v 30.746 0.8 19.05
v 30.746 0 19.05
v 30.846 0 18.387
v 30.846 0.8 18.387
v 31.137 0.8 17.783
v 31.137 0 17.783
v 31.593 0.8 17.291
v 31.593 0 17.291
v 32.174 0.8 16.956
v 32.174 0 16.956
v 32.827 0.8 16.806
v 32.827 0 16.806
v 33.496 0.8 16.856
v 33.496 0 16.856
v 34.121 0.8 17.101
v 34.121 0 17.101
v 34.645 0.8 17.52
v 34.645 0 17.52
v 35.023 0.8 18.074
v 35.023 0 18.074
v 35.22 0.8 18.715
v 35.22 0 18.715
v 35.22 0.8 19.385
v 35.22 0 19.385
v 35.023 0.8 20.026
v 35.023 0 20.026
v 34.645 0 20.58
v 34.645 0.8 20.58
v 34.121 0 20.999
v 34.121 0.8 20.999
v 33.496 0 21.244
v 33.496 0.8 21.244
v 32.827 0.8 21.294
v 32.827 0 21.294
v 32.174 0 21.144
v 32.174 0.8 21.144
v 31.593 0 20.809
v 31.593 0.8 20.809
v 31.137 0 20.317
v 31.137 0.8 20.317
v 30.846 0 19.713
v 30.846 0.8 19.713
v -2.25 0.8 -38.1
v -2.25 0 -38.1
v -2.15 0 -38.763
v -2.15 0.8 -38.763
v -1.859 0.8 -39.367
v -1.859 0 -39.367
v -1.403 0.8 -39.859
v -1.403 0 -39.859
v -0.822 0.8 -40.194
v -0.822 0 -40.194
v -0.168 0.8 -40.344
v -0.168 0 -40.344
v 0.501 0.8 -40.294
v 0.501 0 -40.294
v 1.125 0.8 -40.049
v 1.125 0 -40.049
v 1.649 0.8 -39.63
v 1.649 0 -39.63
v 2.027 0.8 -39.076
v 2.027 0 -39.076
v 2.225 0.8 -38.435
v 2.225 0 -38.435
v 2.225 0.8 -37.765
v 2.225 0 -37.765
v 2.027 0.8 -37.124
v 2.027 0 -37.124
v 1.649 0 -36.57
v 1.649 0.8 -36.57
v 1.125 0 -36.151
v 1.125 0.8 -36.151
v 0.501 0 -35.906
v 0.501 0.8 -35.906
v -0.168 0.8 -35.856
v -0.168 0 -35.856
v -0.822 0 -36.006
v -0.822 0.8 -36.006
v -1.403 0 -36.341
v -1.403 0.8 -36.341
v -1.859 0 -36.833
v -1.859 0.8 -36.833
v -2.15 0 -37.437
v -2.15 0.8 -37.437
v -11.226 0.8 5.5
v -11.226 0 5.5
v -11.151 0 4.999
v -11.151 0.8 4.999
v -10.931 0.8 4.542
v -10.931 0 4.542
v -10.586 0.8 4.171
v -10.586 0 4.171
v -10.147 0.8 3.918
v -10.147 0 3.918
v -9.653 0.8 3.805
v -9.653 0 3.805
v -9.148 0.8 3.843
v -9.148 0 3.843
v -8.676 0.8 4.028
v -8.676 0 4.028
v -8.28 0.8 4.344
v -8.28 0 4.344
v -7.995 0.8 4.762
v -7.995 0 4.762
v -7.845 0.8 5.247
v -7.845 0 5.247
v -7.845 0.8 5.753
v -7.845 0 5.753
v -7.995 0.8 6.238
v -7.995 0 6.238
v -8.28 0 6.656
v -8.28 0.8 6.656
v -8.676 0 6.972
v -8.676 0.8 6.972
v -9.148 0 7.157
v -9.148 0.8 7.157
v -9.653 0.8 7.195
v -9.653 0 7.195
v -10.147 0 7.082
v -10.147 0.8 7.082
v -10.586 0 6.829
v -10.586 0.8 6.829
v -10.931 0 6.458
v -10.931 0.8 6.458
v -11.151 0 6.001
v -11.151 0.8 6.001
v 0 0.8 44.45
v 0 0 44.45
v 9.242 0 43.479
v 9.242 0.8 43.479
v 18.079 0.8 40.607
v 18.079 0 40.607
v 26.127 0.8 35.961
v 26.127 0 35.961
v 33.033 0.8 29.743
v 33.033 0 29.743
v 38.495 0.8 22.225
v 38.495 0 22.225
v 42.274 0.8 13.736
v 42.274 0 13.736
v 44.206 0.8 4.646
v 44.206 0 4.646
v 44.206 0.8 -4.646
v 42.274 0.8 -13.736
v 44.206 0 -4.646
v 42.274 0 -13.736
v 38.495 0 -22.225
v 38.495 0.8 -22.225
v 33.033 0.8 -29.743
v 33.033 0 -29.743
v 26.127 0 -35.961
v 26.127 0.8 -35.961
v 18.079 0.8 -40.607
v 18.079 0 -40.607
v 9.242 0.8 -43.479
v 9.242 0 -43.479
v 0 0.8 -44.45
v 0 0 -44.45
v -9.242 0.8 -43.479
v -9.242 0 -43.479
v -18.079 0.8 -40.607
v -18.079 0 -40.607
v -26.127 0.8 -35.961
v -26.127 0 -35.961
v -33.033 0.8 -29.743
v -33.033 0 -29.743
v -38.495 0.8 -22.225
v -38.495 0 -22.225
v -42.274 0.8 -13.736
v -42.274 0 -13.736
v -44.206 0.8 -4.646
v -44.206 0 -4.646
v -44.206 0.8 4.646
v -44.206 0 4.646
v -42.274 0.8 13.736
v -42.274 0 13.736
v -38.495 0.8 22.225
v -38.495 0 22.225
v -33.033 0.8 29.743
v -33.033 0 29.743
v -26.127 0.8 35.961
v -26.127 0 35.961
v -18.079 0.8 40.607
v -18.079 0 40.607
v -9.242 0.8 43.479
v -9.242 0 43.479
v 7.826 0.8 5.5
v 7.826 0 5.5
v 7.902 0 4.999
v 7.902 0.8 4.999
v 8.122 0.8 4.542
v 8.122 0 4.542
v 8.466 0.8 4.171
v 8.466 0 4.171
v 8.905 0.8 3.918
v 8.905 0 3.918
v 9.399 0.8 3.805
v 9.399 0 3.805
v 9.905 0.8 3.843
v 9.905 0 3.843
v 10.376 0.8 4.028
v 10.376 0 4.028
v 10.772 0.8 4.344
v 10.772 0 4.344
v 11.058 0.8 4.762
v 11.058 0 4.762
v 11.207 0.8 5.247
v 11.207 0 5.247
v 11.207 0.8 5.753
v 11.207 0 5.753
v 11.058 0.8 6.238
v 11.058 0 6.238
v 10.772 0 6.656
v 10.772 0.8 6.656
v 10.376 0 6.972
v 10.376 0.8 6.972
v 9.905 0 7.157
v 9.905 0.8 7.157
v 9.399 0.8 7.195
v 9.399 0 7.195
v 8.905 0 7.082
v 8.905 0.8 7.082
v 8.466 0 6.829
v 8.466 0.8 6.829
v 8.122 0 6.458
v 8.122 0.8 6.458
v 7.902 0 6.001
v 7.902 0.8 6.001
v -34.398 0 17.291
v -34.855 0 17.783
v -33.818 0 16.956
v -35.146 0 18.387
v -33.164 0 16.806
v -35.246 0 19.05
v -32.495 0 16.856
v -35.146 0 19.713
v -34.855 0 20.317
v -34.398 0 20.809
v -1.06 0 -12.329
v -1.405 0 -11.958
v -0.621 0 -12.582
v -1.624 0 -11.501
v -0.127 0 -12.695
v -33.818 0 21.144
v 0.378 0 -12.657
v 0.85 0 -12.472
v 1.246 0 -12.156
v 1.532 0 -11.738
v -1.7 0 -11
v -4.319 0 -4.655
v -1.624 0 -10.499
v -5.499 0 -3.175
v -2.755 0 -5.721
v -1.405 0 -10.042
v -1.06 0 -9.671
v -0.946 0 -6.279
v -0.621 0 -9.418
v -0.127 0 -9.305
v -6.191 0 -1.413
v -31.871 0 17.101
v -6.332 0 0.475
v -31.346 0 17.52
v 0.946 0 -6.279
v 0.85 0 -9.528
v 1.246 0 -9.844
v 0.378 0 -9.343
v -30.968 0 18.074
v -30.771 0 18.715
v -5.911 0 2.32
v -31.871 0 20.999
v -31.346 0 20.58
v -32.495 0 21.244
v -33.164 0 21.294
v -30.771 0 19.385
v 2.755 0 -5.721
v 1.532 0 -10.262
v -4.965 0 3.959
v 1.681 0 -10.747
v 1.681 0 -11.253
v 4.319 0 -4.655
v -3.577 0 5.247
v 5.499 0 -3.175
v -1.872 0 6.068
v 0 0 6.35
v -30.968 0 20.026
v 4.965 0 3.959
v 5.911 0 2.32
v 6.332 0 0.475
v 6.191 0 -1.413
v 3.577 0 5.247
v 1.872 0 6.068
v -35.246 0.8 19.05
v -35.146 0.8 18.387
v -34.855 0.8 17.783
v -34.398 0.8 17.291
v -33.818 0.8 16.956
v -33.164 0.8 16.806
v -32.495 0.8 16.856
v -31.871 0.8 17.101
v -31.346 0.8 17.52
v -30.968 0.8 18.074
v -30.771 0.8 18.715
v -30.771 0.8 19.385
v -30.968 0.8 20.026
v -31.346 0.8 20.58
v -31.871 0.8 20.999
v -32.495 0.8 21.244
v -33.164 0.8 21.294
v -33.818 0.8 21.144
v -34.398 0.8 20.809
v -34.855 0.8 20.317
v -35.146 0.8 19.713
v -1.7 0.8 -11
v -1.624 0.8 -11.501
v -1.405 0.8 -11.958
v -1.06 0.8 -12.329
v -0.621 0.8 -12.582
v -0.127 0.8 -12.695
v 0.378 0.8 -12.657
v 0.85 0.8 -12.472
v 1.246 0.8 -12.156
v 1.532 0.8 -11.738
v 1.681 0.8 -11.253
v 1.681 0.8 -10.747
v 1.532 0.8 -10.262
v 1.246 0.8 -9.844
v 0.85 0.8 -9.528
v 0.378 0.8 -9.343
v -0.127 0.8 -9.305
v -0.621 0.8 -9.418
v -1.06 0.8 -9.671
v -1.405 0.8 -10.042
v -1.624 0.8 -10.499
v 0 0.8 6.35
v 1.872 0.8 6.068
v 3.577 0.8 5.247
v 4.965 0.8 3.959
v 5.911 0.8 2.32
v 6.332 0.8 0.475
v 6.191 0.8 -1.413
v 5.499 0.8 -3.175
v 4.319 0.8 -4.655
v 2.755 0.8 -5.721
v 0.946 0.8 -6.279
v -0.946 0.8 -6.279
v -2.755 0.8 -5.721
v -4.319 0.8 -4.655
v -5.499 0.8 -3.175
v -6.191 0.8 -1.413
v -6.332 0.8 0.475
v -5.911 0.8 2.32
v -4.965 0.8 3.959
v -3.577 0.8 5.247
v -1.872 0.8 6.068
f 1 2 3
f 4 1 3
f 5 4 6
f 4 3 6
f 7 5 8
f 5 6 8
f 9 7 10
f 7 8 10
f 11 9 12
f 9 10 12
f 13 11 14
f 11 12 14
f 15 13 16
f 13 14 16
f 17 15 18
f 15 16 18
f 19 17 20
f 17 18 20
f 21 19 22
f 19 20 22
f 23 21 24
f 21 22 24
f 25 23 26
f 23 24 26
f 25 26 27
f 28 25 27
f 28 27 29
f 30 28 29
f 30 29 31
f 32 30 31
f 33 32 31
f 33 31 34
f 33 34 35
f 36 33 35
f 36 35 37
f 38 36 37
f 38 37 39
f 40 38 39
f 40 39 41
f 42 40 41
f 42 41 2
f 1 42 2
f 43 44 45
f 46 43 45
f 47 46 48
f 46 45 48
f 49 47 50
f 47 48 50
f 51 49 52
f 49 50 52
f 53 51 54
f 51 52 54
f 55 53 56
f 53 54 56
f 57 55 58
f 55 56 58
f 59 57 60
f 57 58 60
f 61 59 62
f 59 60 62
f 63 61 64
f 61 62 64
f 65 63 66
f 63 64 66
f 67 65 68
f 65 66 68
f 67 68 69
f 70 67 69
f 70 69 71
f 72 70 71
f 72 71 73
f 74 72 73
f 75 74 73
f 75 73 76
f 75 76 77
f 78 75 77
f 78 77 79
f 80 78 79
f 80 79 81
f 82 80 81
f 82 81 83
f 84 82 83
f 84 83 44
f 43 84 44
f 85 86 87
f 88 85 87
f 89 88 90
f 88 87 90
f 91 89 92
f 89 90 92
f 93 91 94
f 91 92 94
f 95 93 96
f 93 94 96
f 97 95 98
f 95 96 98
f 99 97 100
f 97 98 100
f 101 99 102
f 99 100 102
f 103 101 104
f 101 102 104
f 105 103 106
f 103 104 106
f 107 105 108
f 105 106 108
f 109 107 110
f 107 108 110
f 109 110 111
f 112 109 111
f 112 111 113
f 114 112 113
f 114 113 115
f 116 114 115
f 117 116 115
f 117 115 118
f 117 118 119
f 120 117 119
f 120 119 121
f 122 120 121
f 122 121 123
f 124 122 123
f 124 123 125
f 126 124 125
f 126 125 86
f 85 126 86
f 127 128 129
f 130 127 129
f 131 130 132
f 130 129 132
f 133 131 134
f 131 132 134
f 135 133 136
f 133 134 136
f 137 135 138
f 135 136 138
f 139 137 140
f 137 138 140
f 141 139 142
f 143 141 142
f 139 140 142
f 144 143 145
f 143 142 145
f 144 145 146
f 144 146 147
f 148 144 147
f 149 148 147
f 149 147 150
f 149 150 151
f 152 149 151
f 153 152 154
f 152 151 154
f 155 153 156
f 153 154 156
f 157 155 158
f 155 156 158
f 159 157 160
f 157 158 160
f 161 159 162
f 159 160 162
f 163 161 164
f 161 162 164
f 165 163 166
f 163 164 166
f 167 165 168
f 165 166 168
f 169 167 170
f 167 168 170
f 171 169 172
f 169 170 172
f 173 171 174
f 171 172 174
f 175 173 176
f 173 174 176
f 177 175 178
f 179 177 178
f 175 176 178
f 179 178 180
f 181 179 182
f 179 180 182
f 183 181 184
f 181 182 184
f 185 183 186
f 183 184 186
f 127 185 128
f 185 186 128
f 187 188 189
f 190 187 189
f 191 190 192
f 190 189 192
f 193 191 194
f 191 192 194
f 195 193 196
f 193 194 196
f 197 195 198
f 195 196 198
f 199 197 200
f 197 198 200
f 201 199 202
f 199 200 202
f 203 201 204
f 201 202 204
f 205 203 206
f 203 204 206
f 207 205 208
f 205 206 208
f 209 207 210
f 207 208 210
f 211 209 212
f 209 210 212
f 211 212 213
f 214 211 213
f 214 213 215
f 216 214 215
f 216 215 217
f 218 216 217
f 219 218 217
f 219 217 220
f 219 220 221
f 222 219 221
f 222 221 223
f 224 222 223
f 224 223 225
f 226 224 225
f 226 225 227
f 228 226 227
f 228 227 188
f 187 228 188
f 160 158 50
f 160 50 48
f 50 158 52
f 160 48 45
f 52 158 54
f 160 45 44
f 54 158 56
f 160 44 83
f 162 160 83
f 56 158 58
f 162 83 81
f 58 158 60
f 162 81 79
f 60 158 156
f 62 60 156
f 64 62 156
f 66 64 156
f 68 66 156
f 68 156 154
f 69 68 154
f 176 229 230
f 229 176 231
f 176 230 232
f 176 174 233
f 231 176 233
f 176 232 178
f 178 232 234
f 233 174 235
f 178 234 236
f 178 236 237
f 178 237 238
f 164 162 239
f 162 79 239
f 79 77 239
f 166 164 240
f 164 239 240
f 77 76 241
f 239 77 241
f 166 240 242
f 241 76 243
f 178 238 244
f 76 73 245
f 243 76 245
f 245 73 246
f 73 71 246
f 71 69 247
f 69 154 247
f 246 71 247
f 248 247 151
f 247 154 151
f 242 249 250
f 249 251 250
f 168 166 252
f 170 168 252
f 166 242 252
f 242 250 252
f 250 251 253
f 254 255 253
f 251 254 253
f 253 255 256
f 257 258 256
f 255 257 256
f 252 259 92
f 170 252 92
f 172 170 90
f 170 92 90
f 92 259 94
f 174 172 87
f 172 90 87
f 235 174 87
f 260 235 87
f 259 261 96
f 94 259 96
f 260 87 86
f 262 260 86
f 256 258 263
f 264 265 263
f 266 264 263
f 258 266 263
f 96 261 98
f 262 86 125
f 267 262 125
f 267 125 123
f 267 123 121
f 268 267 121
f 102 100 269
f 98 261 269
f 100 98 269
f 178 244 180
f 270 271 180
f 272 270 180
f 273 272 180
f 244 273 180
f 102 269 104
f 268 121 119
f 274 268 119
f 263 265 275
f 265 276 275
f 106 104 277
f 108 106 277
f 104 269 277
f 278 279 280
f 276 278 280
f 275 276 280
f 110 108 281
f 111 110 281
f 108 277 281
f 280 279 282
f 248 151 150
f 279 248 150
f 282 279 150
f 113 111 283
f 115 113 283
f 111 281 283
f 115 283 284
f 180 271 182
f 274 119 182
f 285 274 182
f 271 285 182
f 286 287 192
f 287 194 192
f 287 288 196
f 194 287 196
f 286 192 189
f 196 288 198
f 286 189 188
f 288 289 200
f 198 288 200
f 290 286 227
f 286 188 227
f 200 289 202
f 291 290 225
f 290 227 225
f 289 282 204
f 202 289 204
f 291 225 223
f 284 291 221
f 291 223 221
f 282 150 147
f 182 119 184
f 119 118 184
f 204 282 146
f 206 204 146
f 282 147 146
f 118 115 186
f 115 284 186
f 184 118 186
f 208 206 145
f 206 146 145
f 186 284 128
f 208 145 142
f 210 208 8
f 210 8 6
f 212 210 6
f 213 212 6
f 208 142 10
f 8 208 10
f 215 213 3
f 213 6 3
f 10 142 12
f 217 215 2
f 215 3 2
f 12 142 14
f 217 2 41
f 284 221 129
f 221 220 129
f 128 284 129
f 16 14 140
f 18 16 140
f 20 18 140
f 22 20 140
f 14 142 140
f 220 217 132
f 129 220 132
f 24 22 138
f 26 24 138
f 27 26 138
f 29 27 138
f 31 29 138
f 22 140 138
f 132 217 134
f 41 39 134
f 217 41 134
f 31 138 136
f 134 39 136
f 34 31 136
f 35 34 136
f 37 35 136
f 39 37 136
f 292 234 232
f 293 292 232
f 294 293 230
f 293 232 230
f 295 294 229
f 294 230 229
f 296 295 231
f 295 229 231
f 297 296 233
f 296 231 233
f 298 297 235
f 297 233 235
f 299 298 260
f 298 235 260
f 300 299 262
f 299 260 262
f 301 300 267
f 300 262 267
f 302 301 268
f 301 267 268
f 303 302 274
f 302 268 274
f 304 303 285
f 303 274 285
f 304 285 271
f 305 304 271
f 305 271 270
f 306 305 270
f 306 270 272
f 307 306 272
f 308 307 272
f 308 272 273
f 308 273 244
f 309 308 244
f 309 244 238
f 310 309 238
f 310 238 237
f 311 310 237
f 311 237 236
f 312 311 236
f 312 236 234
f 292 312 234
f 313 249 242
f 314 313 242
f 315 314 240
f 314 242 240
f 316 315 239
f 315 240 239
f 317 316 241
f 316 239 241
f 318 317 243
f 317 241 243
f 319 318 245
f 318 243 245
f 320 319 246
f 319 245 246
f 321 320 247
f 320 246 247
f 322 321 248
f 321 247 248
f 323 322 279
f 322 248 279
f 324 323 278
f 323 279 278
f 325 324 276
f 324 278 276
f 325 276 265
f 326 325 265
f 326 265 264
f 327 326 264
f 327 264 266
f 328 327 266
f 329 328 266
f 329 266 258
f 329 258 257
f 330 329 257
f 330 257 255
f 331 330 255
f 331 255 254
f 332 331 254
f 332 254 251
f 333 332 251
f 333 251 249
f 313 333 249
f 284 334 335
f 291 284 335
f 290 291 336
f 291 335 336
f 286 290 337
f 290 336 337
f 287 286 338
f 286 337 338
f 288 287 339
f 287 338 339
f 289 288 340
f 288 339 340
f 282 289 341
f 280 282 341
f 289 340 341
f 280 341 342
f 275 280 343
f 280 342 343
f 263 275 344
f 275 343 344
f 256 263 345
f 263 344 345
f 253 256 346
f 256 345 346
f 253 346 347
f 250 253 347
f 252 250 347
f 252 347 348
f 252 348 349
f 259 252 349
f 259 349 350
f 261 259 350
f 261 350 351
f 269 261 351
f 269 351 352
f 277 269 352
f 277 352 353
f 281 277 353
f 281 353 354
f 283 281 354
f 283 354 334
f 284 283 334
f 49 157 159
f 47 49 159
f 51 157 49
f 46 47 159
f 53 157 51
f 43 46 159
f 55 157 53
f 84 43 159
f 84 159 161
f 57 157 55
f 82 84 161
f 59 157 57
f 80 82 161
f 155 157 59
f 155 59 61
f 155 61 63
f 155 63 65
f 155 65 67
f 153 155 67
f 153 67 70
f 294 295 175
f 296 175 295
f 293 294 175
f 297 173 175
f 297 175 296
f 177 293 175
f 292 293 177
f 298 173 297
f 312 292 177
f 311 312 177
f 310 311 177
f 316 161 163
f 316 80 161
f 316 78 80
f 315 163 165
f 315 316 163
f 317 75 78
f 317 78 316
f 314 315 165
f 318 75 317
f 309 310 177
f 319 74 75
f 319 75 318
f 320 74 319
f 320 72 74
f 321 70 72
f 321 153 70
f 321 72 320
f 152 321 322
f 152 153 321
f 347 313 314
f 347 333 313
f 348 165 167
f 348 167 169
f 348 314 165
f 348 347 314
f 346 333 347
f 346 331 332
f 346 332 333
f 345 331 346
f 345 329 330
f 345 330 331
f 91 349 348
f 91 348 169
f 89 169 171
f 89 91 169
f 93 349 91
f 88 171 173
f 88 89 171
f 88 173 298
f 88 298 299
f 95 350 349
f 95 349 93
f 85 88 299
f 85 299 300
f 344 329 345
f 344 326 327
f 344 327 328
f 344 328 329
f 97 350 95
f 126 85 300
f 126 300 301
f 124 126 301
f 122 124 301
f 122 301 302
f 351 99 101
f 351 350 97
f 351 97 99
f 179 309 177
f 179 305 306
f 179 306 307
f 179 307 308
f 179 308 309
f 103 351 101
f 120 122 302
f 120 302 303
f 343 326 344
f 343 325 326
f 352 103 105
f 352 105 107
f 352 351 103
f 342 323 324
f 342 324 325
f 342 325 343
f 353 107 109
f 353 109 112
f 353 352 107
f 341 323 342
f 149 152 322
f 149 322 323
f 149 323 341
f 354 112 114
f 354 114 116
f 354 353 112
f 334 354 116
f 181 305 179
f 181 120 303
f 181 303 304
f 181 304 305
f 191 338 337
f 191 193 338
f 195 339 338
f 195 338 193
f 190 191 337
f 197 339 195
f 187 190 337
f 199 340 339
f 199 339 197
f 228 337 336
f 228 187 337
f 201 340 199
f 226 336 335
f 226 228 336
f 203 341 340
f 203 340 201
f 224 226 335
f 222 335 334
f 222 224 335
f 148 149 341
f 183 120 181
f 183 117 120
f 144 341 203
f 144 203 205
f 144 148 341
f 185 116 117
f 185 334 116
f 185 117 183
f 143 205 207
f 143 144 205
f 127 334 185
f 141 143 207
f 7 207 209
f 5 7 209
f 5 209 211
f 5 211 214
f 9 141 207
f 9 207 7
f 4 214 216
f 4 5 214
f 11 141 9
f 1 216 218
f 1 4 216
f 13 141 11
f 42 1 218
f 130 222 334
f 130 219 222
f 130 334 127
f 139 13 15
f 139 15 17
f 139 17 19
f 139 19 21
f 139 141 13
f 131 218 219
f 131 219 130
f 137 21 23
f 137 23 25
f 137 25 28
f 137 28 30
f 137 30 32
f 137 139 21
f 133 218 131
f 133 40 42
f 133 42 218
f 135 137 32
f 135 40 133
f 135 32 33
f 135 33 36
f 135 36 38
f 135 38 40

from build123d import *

# Parameters (mm, degrees)
SKETCH1_R            = 44.45
BOSS_EXTRUDE1_DEPTH  = 0.8
M4_CLEARANCE_HOLE1_D = 4.5
SKETCH11_R           = 6.35
CUT_EXTRUDE1_DEPTH   = 63.866883174
M3_CLEARANCE_HOLE1_D = 3.4


with BuildPart() as part:
    # Sketch1 → Boss-Extrude1 (new body)
    with BuildSketch(Plane(origin=(0, 0, 0), x_dir=(1, 0, 0), z_dir=(0, 1, 0))):
        with Locations(Location((0, 0, 0), (0, 0, 270))):
            Circle(SKETCH1_R)
    extrude(amount=BOSS_EXTRUDE1_DEPTH)

    # M4 Clearance Hole1 (through all)
    with Locations(Plane(origin=(0, 0.8, 0), x_dir=(1, 0, 0), z_dir=(0, 1, 0))):
        with Locations((0, 38.1), (-32.995567884, -19.05), (32.995567884, -19.05)):
            Hole(M4_CLEARANCE_HOLE1_D / 2)

    # Sketch11 → Cut-Extrude1 (cut, through all)
    with BuildSketch(Plane(origin=(0, 0.8, 0), x_dir=(1, 0, 0), z_dir=(0, 1, 0))):
        with Locations(Location((0, 0, 0), (0, 0, 270))):
            Circle(SKETCH11_R)
    extrude(amount=-CUT_EXTRUDE1_DEPTH, mode=Mode.SUBTRACT)

    # M3 Clearance Hole1 (through all)
    with Locations(Plane(origin=(0, 0.8, 0), x_dir=(1, 0, 0), z_dir=(0, 1, 0))):
        with Locations((0, 11), (-9.526279442, -5.5), (9.526279442, -5.5)):
            Hole(M3_CLEARANCE_HOLE1_D / 2)


solid = part.part
